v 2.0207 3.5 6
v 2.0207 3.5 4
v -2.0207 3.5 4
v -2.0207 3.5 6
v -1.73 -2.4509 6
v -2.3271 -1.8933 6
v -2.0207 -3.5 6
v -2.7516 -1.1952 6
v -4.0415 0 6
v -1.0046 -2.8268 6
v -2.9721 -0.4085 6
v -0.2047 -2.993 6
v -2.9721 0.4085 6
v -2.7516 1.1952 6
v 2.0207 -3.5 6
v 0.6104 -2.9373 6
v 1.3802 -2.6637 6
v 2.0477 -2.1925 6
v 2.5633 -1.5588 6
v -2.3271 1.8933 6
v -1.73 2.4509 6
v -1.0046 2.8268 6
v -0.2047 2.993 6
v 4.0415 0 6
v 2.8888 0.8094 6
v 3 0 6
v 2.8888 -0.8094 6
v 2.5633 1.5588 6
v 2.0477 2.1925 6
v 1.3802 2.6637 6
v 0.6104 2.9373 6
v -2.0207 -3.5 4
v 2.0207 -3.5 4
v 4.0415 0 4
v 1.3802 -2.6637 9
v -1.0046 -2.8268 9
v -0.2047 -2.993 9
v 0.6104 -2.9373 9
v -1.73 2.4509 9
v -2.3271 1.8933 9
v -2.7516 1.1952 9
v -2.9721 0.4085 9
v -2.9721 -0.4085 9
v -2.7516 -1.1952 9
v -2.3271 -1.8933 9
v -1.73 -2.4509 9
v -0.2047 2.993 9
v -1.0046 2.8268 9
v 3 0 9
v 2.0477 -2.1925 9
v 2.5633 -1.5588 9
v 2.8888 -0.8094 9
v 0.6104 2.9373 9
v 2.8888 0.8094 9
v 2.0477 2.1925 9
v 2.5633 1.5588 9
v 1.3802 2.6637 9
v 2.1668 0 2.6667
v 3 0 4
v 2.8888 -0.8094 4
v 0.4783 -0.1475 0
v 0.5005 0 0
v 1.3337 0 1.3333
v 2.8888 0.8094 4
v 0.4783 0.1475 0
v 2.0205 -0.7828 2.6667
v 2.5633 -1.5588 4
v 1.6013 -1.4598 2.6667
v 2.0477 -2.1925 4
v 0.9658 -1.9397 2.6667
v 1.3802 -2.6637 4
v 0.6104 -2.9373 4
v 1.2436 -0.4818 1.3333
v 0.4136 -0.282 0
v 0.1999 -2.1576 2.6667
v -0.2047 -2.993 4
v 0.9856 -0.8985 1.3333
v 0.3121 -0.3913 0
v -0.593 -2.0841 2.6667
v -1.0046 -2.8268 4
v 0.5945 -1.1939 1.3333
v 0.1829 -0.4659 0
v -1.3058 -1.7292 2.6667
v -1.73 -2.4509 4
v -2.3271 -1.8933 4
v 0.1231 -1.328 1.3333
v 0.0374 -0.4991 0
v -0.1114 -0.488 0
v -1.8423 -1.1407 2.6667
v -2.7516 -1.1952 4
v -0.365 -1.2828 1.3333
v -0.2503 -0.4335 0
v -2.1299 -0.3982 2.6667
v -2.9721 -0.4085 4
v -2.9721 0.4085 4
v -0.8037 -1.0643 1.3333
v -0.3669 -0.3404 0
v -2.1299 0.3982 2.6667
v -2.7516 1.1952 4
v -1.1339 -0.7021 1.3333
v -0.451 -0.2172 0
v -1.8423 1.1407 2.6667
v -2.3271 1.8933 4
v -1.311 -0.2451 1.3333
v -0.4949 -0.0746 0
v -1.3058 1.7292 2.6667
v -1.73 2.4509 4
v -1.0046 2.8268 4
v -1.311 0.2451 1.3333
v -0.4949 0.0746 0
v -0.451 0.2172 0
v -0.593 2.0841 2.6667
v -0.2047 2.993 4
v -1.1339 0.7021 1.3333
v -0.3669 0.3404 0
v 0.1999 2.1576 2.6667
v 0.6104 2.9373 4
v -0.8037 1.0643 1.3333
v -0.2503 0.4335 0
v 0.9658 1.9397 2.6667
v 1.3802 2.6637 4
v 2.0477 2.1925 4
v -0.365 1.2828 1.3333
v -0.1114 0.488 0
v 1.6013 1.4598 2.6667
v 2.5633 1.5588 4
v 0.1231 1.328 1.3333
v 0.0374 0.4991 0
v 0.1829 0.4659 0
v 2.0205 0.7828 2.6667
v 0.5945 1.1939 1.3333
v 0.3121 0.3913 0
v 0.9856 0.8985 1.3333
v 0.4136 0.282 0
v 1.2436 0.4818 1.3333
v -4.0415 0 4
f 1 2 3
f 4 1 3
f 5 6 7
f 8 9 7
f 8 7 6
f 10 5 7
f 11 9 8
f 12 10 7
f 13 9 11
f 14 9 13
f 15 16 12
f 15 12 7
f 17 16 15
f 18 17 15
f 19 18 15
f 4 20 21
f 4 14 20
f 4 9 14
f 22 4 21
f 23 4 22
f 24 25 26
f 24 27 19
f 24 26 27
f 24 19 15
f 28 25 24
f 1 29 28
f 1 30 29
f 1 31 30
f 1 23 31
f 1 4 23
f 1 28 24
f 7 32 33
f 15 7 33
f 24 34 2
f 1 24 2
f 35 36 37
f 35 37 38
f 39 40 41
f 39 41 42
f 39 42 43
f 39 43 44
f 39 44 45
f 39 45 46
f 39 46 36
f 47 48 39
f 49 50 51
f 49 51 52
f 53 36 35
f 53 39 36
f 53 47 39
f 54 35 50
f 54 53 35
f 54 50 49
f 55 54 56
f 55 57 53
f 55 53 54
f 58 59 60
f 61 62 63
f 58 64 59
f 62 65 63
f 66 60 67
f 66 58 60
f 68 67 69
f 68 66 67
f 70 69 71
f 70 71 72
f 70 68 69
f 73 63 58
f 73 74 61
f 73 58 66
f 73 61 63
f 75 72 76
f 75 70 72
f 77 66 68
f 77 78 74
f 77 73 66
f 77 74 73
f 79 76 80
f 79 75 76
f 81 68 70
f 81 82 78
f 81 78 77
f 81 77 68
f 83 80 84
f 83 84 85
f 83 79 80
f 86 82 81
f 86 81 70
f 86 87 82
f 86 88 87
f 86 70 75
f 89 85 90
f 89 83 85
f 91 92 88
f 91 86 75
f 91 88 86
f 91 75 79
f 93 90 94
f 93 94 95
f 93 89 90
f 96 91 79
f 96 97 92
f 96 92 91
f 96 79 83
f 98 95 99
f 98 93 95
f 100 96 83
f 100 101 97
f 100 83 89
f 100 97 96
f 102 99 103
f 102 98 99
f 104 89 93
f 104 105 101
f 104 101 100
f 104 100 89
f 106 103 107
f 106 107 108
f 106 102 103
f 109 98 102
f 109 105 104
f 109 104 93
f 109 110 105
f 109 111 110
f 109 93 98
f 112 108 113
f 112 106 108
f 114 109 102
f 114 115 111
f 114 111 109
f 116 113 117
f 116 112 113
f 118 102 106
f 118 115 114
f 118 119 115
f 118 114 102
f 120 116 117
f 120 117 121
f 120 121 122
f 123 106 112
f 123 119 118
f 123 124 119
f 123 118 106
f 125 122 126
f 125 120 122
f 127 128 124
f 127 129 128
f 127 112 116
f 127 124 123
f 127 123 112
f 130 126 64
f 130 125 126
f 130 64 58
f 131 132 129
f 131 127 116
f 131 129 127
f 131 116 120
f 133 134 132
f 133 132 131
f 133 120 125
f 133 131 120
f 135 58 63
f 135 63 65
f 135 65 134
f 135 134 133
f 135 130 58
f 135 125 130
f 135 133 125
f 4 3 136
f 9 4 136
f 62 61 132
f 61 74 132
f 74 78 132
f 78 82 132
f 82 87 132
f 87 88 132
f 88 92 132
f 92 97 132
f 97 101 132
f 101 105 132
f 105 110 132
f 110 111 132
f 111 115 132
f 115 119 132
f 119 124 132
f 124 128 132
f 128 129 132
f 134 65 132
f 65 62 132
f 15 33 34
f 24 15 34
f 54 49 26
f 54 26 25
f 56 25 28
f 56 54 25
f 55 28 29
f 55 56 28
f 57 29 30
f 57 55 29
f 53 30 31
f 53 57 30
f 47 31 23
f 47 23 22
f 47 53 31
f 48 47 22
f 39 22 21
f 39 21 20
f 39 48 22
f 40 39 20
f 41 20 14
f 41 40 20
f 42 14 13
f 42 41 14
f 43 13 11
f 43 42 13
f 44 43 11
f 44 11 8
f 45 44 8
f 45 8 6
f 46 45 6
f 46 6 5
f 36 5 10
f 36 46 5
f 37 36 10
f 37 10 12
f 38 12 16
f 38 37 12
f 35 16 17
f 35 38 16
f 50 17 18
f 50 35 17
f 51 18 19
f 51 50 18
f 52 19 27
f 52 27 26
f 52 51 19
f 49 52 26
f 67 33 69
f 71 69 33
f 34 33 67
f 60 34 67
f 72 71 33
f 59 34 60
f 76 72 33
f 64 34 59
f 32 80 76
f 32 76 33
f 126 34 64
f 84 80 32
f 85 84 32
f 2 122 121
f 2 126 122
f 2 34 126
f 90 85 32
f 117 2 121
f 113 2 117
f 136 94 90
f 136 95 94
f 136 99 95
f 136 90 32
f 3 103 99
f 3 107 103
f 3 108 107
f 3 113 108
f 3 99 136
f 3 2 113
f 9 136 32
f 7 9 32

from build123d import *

# Parameters (mm, degrees)
BOSS_EXTRU_1_DEPTH      = 9
ESQUISSE2_W             = 19.623971562
ESQUISSE2_H             = 15.534154535
ESQUISSE2_R             = 3
ENL_V_MAT_EXTRU_1_DEPTH = 3
ENL_V_START             = -4
ESQUISSE3_W             = 11.267201257
ESQUISSE3_H             = 13.961169169
ESQUISSE3_R             = 3
ENL_V_MAT_EXTRU_2_DEPTH = 4
CHANFREIN1_SIZE         = 4
CHANFREIN1_SIZE_2       = 2.499477408


with BuildPart() as part:
    # Esquisse1 → Boss.-Extru.1 (new body)
    with BuildSketch(Plane.XY):
        Polygon((4.041451884, 0), (2.020725942, 3.5), (-2.020725942, 3.5), (-4.041451884, 0), (-2.020725942, -3.5), (2.020725942, -3.5), align=None)
    extrude(amount=BOSS_EXTRU_1_DEPTH)

    # Esquisse2 → Enlèv. mat.-Extru.1 (cut)
    with BuildSketch(Plane.XY.offset(9)):
        with Locations((0.327116653, -1.544441398)):
            Rectangle(ESQUISSE2_W, ESQUISSE2_H)
        Circle(ESQUISSE2_R, mode=Mode.SUBTRACT)
    extrude(amount=-ENL_V_MAT_EXTRU_1_DEPTH, mode=Mode.SUBTRACT)

    # Esquisse3 → Enlèv. mat.-Extru.2 (cut)
    with BuildSketch(Plane(origin=(0, 0, 0), x_dir=(-1, 0, 0), z_dir=(0, 0, -1)).offset(ENL_V_START)):
        with Locations((0.009770186, 0.039262349)):
            Rectangle(ESQUISSE3_W, ESQUISSE3_H)
        with Locations(Location((0, 0, 0), (0, 0, 180))):
            Circle(ESQUISSE3_R, mode=Mode.SUBTRACT)
    extrude(amount=ENL_V_MAT_EXTRU_2_DEPTH, mode=Mode.SUBTRACT)

    # Chanfrein1
    # the kernel refuses this chamfer: 4, 2.499477408 mm, written as the material it takes off along each edge
    with BuildSketch(Plane(origin=(0, 0, 0), x_dir=(1, 0, 0), z_dir=(0, 1, 0))) as chanfrein1_piece_1_section:
        Polygon((3, -CHANFREIN1_SIZE), (3 - CHANFREIN1_SIZE_2, 0), (3, 0), align=None)
    chanfrein1_piece_1 = revolve(axis=Axis((0, 0, 0), (0, 0, -1)), mode=Mode.PRIVATE)
    chanfrein1_piece_1 = split(chanfrein1_piece_1, bisect_by=Plane(origin=(-1.744026904, 0, 4), z_dir=(0, 0, -1)), keep=Keep.TOP, mode=Mode.PRIVATE)
    add(chanfrein1_piece_1, mode=Mode.SUBTRACT)


solid = part.part
